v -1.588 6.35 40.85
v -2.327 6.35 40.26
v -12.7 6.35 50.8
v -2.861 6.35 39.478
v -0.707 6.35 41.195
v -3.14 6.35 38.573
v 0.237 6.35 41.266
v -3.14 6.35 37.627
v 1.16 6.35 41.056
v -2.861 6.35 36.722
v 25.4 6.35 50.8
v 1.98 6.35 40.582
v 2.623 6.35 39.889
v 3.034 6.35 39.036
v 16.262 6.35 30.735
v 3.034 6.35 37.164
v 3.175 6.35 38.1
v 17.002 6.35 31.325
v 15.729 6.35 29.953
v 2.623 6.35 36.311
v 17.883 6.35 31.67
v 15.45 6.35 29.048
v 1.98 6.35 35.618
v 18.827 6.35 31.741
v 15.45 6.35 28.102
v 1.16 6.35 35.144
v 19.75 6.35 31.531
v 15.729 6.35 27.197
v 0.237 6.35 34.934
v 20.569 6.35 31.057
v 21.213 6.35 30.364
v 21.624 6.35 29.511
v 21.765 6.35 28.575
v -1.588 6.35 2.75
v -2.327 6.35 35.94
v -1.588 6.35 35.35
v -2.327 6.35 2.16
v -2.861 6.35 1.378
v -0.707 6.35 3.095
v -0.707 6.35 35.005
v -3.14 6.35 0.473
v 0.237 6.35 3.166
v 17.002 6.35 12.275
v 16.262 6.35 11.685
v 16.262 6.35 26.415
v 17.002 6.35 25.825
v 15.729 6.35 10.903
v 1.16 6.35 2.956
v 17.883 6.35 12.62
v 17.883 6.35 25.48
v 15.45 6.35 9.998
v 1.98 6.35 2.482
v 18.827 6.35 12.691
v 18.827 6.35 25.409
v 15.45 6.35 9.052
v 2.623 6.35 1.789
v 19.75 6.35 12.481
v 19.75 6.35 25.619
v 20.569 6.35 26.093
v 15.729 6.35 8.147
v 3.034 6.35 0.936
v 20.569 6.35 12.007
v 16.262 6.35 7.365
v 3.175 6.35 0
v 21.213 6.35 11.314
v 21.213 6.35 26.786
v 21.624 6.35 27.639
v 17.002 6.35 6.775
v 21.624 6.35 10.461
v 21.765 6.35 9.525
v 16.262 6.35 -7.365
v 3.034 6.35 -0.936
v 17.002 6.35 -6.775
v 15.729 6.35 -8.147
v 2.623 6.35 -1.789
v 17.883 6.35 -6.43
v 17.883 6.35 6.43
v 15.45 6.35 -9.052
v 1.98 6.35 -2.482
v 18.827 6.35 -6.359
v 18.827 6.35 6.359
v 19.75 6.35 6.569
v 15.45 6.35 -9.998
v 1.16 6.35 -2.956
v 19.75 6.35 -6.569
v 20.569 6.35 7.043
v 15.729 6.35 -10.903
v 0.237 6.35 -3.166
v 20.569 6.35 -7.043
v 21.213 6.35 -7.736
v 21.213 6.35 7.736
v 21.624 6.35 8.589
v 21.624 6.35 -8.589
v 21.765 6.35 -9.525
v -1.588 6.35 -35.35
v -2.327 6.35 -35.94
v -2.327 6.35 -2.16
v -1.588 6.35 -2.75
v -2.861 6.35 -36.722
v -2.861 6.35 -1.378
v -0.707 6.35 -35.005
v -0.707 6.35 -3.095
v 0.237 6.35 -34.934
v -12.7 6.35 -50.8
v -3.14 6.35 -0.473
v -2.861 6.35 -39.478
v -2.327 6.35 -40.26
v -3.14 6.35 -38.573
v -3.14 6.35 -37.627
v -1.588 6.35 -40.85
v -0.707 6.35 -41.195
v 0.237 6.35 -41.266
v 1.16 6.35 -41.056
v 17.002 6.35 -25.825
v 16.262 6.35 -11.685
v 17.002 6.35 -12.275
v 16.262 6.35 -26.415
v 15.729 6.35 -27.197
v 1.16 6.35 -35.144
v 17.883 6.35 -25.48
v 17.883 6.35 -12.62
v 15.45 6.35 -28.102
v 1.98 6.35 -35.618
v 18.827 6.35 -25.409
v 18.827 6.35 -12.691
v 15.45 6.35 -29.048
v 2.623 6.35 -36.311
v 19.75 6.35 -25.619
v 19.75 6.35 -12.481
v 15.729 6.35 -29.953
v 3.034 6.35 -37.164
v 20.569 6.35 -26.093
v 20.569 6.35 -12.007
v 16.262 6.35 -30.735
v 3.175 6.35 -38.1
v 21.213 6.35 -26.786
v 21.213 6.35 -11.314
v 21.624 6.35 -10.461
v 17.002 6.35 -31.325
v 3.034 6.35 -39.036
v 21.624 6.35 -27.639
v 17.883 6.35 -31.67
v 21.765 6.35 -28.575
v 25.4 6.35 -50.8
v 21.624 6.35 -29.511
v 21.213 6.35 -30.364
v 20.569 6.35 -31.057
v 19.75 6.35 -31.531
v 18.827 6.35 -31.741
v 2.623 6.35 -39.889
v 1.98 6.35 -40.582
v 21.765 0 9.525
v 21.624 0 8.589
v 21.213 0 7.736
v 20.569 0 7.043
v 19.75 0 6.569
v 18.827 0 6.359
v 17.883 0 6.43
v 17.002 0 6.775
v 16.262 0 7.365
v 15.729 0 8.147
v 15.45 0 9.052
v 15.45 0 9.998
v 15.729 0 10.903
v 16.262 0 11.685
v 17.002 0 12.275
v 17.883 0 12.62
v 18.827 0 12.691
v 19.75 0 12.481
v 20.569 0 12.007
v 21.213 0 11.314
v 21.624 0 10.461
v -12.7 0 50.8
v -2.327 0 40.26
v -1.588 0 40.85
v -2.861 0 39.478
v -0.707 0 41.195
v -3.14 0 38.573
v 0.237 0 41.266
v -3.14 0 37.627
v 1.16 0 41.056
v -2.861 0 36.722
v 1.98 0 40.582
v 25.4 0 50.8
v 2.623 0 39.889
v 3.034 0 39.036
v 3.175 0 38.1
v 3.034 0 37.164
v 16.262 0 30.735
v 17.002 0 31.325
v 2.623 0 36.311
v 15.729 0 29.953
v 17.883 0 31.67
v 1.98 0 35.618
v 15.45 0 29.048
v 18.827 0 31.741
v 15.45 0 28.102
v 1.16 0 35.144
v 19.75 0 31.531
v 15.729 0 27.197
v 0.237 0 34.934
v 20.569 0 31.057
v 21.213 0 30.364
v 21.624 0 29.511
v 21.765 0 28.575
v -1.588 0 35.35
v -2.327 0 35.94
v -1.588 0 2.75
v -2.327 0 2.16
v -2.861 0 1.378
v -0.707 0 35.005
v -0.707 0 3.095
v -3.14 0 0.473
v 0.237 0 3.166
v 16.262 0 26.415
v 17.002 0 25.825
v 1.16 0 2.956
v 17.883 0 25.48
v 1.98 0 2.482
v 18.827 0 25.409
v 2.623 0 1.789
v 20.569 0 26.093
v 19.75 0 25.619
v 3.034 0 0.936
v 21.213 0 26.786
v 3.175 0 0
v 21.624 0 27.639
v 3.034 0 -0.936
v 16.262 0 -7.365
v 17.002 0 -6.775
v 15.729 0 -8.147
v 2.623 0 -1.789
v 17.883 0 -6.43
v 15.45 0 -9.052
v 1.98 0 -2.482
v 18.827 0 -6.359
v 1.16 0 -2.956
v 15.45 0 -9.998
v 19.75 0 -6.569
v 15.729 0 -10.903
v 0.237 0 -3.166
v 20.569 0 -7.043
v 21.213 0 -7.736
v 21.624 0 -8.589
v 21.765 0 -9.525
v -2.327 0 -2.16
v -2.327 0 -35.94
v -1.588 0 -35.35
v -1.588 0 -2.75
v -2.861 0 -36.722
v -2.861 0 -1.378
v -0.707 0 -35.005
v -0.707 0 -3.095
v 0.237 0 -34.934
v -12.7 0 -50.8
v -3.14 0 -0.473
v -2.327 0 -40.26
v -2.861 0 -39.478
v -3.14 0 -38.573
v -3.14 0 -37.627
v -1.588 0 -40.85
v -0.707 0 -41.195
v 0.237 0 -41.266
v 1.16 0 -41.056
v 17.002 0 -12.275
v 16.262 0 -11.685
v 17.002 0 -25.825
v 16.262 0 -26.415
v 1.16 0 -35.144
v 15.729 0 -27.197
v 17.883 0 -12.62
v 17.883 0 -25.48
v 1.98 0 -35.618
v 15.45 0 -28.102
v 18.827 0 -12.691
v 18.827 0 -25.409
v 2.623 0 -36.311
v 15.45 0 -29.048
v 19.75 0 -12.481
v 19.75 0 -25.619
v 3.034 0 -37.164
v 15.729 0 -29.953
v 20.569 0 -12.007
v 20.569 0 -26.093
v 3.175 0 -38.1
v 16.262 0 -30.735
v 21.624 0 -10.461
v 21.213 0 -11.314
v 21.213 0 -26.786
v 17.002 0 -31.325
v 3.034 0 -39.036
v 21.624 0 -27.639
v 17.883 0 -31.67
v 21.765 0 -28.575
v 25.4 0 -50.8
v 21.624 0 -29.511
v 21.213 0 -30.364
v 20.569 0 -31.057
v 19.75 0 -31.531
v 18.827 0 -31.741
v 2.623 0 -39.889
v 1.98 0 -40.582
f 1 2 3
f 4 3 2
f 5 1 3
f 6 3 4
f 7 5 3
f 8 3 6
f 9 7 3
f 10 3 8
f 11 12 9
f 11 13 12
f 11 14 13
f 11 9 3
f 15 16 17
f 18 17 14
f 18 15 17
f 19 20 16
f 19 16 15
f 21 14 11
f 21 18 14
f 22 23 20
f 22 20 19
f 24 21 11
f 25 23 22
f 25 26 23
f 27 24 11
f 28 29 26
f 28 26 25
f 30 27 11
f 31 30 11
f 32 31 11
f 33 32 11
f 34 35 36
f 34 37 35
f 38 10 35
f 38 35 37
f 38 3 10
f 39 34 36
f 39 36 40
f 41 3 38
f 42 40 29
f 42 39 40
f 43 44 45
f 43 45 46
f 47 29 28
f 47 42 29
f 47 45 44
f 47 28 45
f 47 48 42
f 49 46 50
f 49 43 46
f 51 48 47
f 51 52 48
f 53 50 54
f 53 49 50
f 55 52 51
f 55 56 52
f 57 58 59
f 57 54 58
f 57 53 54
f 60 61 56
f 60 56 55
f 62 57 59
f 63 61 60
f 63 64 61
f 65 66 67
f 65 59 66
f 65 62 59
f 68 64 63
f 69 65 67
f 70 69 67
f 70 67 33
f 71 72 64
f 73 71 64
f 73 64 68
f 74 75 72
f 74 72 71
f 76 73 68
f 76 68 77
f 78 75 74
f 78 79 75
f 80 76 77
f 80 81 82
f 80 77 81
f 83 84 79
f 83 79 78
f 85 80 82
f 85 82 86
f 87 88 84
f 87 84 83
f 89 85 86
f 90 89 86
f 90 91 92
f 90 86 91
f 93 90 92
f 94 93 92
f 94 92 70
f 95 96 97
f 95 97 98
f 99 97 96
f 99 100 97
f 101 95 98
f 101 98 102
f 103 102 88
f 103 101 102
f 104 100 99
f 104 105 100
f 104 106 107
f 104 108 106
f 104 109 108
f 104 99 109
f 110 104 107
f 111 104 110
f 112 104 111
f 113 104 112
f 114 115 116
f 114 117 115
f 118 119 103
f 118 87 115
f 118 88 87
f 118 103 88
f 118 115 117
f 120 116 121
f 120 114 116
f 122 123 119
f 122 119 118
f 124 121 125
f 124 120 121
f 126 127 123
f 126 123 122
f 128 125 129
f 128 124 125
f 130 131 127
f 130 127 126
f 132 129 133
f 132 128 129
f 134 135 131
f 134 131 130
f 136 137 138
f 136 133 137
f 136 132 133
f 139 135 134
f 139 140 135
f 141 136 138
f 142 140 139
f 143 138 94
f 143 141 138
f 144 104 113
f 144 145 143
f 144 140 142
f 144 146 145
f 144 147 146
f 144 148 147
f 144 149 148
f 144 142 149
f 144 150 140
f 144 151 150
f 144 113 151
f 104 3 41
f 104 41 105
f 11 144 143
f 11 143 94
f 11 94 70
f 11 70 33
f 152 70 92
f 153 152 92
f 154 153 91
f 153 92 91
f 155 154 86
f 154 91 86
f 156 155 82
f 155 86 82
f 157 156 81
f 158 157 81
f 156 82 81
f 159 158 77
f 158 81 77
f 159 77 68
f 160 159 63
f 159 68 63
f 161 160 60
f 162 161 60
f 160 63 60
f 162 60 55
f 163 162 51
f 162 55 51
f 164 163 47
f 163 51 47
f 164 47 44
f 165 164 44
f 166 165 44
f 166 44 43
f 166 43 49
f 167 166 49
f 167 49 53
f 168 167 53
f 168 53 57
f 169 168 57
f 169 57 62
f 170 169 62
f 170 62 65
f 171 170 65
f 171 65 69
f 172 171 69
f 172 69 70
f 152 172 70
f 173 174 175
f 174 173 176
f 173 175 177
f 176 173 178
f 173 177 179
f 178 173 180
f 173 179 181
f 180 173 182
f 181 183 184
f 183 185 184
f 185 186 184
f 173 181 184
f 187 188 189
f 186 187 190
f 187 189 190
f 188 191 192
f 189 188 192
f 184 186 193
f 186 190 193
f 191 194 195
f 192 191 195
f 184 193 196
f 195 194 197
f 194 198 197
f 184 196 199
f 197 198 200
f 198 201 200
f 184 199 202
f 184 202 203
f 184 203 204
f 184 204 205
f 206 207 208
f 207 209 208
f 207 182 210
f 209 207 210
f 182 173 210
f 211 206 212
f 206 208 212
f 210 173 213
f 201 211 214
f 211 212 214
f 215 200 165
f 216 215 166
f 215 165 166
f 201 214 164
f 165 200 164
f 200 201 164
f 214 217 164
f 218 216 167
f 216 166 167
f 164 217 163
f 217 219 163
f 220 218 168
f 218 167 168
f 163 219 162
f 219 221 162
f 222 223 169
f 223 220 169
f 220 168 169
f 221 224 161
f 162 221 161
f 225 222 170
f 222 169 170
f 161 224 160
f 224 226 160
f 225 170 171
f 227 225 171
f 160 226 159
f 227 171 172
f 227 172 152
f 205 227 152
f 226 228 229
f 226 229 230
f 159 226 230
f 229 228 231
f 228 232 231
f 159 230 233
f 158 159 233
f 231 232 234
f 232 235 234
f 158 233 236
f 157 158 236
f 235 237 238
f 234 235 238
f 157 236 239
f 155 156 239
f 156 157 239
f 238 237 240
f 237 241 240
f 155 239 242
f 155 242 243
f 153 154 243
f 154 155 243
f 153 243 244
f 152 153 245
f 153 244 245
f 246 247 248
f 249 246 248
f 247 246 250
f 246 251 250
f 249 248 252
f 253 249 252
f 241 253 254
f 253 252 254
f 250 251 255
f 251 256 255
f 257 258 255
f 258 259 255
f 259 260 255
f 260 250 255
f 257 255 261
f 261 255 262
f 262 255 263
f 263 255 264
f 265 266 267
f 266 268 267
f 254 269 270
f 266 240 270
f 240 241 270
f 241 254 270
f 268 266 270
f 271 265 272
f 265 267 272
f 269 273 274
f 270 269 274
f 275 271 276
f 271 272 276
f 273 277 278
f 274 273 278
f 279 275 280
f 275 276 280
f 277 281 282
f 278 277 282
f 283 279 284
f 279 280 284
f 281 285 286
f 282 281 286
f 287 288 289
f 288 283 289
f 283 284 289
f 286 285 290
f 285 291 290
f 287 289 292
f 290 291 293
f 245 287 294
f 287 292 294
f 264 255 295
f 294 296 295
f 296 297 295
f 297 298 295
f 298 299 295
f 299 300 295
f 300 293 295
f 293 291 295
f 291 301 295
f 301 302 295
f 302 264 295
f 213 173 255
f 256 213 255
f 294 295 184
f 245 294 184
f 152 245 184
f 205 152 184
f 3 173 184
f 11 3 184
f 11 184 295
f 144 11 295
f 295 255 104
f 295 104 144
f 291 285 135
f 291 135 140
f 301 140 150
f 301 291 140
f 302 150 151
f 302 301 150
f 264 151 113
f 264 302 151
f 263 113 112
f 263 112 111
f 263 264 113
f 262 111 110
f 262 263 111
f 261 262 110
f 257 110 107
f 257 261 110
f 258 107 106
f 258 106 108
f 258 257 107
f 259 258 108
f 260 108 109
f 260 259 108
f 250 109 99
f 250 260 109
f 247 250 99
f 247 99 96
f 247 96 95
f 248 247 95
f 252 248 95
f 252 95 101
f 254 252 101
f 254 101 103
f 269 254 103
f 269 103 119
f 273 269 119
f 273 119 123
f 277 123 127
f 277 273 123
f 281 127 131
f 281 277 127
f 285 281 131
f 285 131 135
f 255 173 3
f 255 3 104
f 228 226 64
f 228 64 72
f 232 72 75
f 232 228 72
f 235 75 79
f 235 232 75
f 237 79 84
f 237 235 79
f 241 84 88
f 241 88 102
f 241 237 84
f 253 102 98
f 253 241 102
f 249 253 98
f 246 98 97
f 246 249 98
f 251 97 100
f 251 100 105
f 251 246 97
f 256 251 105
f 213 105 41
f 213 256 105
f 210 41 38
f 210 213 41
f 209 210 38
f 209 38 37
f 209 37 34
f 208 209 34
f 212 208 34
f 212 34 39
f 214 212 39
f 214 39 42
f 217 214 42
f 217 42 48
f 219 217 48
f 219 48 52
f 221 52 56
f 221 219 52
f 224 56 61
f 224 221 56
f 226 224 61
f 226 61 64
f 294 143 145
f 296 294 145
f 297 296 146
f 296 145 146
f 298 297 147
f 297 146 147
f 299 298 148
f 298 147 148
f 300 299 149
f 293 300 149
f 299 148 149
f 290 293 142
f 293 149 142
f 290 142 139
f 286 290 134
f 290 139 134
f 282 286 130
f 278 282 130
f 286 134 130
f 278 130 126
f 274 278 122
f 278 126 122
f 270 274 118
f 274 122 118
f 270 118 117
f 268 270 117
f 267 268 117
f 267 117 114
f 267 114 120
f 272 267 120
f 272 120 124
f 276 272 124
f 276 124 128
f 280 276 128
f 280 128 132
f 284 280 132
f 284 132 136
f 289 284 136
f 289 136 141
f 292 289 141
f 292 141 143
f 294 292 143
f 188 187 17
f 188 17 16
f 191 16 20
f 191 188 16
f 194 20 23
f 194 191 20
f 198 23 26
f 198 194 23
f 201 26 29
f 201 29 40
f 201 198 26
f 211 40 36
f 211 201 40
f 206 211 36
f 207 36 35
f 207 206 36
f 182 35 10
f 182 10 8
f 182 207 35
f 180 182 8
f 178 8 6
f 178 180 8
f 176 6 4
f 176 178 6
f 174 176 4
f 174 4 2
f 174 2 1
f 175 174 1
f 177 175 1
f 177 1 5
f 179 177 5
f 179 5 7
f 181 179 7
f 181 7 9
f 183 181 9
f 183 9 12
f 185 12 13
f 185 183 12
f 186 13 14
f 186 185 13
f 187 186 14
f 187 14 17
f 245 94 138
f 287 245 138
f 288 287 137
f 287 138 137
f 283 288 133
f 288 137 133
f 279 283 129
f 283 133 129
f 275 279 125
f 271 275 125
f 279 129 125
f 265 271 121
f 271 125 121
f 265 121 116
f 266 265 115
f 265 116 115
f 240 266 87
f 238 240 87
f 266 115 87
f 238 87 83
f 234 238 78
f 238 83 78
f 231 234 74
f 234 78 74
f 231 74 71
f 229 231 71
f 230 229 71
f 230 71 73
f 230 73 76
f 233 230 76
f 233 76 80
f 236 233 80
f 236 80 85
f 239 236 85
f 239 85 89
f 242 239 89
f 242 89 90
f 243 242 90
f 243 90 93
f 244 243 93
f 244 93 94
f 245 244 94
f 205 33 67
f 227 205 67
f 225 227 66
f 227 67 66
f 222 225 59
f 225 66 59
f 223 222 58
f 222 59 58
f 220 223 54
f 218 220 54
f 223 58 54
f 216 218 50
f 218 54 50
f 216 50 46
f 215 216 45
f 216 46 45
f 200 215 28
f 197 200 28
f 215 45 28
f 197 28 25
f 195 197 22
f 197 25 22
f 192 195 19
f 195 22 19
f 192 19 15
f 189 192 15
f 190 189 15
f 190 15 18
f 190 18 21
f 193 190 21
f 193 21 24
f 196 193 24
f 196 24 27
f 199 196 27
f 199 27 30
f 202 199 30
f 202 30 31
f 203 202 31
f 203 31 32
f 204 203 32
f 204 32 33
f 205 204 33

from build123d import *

# Parameters (mm, degrees)
SKETCH2_W           = 38.1
SKETCH2_H           = 101.6
SKETCH2_R           = 3.175
BOSS_EXTRUDE1_DEPTH = 6.35
SKETCH3_R           = 3.175
CUT_EXTRUDE2_DEPTH  = 7.35


with BuildPart() as part:
    # Sketch2 → Boss-Extrude1 (new body)
    with BuildSketch(Plane(origin=(0, 0, 0), x_dir=(1, 0, 0), z_dir=(0, 1, 0))):
        with Locations((6.35, 0)):
            Rectangle(SKETCH2_W, SKETCH2_H)
        Circle(SKETCH2_R, mode=Mode.SUBTRACT)
        with Locations((0, 38.1)):
            Circle(SKETCH2_R, mode=Mode.SUBTRACT)
        with Locations((0, -38.1)):
            Circle(SKETCH2_R, mode=Mode.SUBTRACT)
    extrude(amount=BOSS_EXTRUDE1_DEPTH)

    # Sketch3 → Cut-Extrude2 (cut, through all)
    with BuildSketch(Plane(origin=(0, 6.35, 0), x_dir=(1, 0, 0), z_dir=(0, 1, 0))):
        with Locations((18.58962745, 28.575)):
            Circle(SKETCH3_R)
        with Locations((18.58962745, 9.525)):
            Circle(SKETCH3_R)
        with Locations((18.58962745, -9.525)):
            Circle(SKETCH3_R)
        with Locations((18.58962745, -28.575)):
            Circle(SKETCH3_R)
    extrude(amount=-CUT_EXTRUDE2_DEPTH, mode=Mode.SUBTRACT)


solid = part.part
